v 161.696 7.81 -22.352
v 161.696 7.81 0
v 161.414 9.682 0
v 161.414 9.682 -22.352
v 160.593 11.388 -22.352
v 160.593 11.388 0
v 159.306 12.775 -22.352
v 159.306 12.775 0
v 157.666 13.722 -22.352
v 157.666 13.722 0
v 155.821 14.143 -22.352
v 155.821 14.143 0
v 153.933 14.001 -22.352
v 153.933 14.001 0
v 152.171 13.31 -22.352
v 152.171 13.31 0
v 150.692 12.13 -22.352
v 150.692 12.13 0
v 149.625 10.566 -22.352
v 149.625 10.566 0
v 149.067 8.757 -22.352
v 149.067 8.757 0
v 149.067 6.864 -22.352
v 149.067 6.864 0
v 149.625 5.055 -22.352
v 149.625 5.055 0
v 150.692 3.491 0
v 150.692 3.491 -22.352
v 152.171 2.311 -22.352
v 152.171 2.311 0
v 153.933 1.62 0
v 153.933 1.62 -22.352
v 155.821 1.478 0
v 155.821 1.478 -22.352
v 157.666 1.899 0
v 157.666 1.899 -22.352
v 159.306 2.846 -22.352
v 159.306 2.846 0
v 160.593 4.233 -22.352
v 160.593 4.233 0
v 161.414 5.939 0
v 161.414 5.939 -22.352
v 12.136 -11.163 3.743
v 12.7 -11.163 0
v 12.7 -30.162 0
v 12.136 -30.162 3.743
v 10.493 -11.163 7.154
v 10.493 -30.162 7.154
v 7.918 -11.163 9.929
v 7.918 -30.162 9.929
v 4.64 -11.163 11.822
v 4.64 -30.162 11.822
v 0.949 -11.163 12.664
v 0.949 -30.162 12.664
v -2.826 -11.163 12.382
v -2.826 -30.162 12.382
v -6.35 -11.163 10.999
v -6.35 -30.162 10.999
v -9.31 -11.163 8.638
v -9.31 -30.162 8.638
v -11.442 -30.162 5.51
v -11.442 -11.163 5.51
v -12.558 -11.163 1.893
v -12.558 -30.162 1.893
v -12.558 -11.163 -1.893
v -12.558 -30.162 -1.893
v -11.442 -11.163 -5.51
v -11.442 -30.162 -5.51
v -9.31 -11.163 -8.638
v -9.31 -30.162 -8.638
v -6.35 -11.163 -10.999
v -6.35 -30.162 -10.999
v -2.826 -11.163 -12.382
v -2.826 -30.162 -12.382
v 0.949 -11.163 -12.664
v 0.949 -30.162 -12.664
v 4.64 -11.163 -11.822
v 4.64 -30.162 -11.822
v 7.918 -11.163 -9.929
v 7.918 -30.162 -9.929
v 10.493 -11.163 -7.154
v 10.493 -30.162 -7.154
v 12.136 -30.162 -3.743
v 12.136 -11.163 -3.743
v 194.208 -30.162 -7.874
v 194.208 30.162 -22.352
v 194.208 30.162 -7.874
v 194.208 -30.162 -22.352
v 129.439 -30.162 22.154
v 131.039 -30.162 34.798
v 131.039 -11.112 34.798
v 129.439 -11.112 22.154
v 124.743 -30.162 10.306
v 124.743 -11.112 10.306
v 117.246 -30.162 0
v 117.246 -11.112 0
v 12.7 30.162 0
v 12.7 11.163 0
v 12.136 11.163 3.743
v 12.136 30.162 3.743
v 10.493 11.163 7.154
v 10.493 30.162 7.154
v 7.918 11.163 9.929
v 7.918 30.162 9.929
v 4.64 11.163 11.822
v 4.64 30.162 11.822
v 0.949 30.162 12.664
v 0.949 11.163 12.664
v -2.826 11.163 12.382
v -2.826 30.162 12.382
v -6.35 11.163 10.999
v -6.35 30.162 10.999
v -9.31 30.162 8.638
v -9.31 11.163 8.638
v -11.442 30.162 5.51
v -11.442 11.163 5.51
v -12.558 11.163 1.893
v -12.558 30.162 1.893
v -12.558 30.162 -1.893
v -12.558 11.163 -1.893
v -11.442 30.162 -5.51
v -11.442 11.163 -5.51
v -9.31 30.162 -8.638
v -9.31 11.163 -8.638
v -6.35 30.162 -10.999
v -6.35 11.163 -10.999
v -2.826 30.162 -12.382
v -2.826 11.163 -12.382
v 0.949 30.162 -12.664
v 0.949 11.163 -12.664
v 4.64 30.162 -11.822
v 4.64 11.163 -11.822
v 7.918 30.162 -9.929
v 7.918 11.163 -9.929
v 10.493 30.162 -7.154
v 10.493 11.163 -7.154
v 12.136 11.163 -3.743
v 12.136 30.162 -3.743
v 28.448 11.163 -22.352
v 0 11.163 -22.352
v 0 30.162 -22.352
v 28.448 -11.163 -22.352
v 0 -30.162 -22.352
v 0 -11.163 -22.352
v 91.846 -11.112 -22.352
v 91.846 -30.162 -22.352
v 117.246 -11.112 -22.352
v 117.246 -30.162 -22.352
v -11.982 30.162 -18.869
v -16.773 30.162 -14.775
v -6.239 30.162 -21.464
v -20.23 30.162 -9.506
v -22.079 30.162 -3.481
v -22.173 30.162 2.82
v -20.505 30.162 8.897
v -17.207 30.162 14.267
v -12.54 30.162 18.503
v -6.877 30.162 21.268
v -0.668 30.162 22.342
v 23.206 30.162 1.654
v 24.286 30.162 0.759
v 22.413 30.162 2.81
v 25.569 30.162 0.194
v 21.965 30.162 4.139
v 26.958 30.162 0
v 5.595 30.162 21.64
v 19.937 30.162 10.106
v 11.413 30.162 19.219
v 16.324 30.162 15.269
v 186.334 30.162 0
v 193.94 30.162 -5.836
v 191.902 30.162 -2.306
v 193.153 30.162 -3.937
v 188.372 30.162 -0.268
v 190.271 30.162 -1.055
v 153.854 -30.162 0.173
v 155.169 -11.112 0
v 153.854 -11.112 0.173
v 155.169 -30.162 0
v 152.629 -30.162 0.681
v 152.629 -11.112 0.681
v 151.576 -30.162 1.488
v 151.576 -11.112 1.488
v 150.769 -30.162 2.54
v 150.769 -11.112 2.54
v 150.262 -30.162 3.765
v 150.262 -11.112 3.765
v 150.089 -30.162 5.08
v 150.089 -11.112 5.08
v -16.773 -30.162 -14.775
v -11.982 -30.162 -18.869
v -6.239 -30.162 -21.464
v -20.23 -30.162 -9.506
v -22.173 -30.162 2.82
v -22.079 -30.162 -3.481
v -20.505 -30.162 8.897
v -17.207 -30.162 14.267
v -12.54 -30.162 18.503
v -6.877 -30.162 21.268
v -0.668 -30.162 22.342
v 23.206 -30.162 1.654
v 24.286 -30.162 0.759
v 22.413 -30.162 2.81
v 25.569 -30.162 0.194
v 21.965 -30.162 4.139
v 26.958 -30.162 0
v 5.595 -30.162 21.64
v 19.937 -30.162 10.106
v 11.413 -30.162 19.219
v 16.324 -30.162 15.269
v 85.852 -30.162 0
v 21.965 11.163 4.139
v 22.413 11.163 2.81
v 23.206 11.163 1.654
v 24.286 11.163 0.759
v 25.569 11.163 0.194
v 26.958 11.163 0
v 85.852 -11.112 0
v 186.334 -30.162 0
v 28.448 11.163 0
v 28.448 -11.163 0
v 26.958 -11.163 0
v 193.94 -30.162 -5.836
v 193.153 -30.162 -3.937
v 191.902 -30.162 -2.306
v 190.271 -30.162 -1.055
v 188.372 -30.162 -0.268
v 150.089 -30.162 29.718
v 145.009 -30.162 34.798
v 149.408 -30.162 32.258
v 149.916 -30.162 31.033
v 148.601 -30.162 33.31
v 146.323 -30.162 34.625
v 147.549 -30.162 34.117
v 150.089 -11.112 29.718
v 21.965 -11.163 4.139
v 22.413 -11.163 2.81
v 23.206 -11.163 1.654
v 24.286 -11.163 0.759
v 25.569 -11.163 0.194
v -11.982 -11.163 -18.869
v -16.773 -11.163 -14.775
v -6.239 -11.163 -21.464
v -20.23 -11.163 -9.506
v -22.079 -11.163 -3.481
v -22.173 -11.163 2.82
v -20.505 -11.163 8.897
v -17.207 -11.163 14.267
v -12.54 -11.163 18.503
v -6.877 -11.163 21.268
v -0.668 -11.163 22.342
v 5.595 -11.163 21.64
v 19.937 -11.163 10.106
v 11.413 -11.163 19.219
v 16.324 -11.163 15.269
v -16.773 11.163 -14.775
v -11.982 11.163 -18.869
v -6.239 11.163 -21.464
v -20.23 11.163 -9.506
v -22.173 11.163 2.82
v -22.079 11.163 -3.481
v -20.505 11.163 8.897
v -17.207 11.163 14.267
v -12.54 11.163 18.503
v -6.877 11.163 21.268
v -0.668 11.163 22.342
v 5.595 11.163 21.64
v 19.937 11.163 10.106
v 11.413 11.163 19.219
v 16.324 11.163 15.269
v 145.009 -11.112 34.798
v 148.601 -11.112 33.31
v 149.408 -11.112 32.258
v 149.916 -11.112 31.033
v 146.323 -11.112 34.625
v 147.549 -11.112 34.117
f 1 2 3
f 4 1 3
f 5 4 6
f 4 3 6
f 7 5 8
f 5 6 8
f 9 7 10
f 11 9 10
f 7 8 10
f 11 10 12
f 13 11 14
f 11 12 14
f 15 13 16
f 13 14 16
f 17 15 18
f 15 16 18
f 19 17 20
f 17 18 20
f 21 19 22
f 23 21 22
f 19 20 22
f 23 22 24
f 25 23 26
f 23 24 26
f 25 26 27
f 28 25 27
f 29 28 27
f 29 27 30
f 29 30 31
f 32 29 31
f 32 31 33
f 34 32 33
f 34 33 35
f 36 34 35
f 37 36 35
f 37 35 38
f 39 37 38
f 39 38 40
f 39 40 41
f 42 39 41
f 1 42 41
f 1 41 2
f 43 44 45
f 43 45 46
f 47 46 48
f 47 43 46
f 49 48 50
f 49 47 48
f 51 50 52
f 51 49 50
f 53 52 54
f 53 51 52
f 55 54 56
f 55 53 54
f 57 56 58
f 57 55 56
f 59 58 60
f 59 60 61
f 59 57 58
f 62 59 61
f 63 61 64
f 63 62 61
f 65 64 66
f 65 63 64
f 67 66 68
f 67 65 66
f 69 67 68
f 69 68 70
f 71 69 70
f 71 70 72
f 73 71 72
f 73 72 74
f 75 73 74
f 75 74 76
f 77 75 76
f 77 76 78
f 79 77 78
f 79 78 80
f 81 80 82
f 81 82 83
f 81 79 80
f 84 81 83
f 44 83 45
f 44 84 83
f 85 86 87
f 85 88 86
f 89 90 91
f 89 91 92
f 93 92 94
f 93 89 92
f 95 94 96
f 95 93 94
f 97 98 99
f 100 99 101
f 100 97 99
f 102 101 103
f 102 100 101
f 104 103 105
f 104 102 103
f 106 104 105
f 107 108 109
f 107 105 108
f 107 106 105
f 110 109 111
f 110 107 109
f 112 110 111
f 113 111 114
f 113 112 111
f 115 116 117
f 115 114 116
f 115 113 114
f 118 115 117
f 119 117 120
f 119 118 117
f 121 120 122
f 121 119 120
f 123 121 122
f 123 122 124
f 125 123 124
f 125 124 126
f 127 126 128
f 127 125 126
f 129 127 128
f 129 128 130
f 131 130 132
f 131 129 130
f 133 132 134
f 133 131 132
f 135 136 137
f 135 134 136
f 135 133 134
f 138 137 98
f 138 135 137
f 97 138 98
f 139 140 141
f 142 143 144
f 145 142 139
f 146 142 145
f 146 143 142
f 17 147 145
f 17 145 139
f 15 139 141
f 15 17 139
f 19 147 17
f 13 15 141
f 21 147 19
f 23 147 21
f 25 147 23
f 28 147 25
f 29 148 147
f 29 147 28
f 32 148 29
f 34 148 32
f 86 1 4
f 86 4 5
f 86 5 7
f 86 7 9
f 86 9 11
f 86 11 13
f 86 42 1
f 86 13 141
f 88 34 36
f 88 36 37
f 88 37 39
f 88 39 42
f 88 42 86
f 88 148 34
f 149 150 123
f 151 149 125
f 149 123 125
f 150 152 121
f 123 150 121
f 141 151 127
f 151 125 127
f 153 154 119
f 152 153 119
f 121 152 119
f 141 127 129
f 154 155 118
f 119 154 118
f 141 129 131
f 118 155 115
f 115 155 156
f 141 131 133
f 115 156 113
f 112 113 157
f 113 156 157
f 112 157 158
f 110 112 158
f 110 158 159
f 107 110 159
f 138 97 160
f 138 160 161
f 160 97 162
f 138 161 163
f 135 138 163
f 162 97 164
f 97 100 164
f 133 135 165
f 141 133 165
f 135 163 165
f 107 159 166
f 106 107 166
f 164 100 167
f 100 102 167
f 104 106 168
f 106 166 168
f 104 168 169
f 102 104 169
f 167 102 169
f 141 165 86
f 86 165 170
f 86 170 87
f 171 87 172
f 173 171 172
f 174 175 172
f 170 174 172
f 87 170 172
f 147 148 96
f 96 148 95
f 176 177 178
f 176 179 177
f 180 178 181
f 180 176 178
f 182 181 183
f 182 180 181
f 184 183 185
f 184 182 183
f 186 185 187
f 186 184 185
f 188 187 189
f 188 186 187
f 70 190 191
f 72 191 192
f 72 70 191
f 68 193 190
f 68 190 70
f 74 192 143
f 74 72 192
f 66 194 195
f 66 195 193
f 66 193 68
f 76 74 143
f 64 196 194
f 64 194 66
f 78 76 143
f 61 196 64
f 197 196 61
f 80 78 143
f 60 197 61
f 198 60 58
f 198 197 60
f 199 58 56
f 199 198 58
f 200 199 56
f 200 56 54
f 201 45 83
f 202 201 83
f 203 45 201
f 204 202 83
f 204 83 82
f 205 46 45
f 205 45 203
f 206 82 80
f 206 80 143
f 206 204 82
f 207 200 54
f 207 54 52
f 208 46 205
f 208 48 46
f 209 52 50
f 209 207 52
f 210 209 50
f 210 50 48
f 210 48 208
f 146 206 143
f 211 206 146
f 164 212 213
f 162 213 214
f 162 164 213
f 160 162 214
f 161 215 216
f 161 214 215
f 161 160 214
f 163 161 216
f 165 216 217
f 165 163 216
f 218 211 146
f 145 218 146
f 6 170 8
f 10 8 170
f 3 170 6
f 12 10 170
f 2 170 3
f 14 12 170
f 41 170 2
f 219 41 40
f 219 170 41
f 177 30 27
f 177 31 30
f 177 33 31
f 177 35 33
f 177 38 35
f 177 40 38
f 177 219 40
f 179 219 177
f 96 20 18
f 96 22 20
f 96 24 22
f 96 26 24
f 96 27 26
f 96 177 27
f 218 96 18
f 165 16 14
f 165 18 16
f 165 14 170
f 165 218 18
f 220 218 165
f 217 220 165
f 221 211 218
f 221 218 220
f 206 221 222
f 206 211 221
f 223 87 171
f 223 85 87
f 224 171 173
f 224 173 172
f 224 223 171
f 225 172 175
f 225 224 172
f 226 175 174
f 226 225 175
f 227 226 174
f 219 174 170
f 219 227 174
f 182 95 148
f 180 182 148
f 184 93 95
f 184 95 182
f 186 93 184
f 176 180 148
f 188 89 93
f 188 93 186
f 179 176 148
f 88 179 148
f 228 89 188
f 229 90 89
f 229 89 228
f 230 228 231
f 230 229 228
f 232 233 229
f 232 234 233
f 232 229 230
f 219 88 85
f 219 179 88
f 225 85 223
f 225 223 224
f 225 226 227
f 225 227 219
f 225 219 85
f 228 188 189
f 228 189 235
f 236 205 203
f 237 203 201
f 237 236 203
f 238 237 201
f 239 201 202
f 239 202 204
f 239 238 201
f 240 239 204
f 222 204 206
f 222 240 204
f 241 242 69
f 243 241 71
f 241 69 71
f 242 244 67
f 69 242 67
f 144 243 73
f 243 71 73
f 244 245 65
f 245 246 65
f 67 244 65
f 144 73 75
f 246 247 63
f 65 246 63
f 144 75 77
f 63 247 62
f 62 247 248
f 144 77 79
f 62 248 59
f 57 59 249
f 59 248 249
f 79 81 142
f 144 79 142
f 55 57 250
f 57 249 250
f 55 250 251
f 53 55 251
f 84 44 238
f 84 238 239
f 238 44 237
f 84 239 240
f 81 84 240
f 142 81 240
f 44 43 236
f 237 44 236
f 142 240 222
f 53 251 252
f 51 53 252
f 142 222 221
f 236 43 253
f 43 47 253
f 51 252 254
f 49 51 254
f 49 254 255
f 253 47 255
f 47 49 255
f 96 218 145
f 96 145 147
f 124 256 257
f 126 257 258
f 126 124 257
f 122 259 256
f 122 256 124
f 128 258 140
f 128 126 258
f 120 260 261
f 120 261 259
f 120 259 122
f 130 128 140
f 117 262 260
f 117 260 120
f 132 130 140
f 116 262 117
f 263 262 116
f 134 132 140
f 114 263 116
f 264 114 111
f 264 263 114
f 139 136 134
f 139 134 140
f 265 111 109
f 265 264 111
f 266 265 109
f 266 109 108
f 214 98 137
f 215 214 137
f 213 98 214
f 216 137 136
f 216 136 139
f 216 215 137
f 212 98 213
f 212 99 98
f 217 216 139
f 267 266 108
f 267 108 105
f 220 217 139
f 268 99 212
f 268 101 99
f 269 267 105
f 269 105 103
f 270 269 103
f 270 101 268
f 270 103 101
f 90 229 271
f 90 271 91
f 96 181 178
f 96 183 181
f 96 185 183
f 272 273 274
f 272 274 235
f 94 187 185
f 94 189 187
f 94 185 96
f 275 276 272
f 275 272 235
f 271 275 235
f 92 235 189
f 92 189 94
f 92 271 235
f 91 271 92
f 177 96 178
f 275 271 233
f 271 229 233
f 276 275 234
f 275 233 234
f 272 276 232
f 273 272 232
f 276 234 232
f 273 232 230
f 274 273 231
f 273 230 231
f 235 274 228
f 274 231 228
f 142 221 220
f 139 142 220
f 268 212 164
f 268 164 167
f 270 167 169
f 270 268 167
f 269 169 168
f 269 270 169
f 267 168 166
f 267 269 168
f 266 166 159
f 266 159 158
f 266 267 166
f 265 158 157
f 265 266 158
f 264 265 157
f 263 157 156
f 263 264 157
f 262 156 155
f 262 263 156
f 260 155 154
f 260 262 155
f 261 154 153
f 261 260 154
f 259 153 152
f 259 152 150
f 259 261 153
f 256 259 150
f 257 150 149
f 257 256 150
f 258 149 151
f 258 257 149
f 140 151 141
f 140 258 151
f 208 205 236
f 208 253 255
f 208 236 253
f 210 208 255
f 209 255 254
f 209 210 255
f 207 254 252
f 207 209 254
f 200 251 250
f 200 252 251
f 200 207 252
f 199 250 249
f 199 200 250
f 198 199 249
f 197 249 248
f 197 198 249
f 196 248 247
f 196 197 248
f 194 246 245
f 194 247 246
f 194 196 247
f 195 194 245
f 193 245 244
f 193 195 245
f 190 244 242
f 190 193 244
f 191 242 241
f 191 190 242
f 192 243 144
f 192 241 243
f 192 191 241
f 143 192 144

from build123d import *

# Parameters (mm, degrees)
F0_R      = 12.7
F11_DEPTH = 30.1625
F2_DEPTH  = 19.05
F4_DEPTH  = 41.275
F5_R      = 5.08
F6_R      = 7.874
F7_W      = 50.8
F7_H      = 22.3266
F8_DEPTH  = 38.1
F9_R      = 6.35
F10_DEPTH = 22.353


with BuildPart() as f11:
    # F0 (on Front) → F11 (new body, symmetric)
    with BuildSketch(Plane.XZ):
        with BuildLine():
            Line((85.852, 0), (22.352, 0))
            ThreePointArc((22.352, 0), (-15.805251, 15.805251), (0, -22.352))
            Line((0, -22.352), (91.8464, -22.352))
            Line((91.8464, -22.352), (85.852, 0))
        make_face()
        Circle(F0_R, mode=Mode.SUBTRACT)
        with BuildLine():
            ThreePointArc((131.0386, 34.798), (127.464415, 16.082358), (117.2464, 0))
            Line((117.2464, 0), (117.2464, -22.352))
            Line((117.2464, -22.352), (194.2084, -22.352))
            Line((194.2084, -22.352), (194.2084, 0))
            Line((194.2084, 0), (150.0886, 0))
            Line((150.0886, 0), (150.0886, 34.798))
            Line((150.0886, 34.798), (131.0386, 34.798))
        make_face()
        Polygon((117.2464, 0), (85.852, 0), (91.8464, -22.352), (117.2464, -22.352), align=None)
    extrude(amount=F11_DEPTH, both=True)

    # F1 (on face) → F2 (cut)
    with BuildSketch(Plane.XZ.offset(30.1625)):
        Polygon((117.2464, 0), (85.852, 0), (91.8464, -22.352), (117.2464, -22.352), align=None)
    extrude(amount=-F2_DEPTH, mode=Mode.SUBTRACT)

    # F3 (on face) → F4 (cut)
    with BuildSketch(Plane(origin=(0, 30.1625, 0), x_dir=(-1, 0, 0), z_dir=(0, 1, 0))):
        with BuildLine():
            Line((-150.0886, 34.798), (-150.0886, 0))
            Line((-150.0886, 0), (-117.2464, 0))
            ThreePointArc((-117.2464, 0), (-127.464415, 16.082358), (-131.0386, 34.798))
            Line((-131.0386, 34.798), (-150.0886, 34.798))
        make_face()
    extrude(amount=-F4_DEPTH, mode=Mode.SUBTRACT)

    # F5
    f5_edges = [f11.edges().sort_by_distance(p)[0] for p in [
        (22.352, 0, 0),
        (150.0886, -20.6375, 34.798),
        (150.0886, -20.6375, 0),
    ]]
    fillet(f5_edges, radius=F5_R)

    # F6
    f6_edges = [f11.edges().sort_by_distance(p)[0] for p in [
        (194.2084, 0, 0),
    ]]
    fillet(f6_edges, radius=F6_R)

    # F7 (on Top) → F8 (cut, symmetric)
    with BuildSketch(Plane.XY):
        with Locations((3.048, 0)):
            Rectangle(F7_W, F7_H)
    extrude(amount=F8_DEPTH, both=True, mode=Mode.SUBTRACT)

    # F9 (on face) → F10 (cut, through all)
    with BuildSketch(Plane.XY):
        with Locations((155.3464, 7.8105)):
            Circle(F9_R)
    extrude(amount=-F10_DEPTH, mode=Mode.SUBTRACT)


solid = f11.part
